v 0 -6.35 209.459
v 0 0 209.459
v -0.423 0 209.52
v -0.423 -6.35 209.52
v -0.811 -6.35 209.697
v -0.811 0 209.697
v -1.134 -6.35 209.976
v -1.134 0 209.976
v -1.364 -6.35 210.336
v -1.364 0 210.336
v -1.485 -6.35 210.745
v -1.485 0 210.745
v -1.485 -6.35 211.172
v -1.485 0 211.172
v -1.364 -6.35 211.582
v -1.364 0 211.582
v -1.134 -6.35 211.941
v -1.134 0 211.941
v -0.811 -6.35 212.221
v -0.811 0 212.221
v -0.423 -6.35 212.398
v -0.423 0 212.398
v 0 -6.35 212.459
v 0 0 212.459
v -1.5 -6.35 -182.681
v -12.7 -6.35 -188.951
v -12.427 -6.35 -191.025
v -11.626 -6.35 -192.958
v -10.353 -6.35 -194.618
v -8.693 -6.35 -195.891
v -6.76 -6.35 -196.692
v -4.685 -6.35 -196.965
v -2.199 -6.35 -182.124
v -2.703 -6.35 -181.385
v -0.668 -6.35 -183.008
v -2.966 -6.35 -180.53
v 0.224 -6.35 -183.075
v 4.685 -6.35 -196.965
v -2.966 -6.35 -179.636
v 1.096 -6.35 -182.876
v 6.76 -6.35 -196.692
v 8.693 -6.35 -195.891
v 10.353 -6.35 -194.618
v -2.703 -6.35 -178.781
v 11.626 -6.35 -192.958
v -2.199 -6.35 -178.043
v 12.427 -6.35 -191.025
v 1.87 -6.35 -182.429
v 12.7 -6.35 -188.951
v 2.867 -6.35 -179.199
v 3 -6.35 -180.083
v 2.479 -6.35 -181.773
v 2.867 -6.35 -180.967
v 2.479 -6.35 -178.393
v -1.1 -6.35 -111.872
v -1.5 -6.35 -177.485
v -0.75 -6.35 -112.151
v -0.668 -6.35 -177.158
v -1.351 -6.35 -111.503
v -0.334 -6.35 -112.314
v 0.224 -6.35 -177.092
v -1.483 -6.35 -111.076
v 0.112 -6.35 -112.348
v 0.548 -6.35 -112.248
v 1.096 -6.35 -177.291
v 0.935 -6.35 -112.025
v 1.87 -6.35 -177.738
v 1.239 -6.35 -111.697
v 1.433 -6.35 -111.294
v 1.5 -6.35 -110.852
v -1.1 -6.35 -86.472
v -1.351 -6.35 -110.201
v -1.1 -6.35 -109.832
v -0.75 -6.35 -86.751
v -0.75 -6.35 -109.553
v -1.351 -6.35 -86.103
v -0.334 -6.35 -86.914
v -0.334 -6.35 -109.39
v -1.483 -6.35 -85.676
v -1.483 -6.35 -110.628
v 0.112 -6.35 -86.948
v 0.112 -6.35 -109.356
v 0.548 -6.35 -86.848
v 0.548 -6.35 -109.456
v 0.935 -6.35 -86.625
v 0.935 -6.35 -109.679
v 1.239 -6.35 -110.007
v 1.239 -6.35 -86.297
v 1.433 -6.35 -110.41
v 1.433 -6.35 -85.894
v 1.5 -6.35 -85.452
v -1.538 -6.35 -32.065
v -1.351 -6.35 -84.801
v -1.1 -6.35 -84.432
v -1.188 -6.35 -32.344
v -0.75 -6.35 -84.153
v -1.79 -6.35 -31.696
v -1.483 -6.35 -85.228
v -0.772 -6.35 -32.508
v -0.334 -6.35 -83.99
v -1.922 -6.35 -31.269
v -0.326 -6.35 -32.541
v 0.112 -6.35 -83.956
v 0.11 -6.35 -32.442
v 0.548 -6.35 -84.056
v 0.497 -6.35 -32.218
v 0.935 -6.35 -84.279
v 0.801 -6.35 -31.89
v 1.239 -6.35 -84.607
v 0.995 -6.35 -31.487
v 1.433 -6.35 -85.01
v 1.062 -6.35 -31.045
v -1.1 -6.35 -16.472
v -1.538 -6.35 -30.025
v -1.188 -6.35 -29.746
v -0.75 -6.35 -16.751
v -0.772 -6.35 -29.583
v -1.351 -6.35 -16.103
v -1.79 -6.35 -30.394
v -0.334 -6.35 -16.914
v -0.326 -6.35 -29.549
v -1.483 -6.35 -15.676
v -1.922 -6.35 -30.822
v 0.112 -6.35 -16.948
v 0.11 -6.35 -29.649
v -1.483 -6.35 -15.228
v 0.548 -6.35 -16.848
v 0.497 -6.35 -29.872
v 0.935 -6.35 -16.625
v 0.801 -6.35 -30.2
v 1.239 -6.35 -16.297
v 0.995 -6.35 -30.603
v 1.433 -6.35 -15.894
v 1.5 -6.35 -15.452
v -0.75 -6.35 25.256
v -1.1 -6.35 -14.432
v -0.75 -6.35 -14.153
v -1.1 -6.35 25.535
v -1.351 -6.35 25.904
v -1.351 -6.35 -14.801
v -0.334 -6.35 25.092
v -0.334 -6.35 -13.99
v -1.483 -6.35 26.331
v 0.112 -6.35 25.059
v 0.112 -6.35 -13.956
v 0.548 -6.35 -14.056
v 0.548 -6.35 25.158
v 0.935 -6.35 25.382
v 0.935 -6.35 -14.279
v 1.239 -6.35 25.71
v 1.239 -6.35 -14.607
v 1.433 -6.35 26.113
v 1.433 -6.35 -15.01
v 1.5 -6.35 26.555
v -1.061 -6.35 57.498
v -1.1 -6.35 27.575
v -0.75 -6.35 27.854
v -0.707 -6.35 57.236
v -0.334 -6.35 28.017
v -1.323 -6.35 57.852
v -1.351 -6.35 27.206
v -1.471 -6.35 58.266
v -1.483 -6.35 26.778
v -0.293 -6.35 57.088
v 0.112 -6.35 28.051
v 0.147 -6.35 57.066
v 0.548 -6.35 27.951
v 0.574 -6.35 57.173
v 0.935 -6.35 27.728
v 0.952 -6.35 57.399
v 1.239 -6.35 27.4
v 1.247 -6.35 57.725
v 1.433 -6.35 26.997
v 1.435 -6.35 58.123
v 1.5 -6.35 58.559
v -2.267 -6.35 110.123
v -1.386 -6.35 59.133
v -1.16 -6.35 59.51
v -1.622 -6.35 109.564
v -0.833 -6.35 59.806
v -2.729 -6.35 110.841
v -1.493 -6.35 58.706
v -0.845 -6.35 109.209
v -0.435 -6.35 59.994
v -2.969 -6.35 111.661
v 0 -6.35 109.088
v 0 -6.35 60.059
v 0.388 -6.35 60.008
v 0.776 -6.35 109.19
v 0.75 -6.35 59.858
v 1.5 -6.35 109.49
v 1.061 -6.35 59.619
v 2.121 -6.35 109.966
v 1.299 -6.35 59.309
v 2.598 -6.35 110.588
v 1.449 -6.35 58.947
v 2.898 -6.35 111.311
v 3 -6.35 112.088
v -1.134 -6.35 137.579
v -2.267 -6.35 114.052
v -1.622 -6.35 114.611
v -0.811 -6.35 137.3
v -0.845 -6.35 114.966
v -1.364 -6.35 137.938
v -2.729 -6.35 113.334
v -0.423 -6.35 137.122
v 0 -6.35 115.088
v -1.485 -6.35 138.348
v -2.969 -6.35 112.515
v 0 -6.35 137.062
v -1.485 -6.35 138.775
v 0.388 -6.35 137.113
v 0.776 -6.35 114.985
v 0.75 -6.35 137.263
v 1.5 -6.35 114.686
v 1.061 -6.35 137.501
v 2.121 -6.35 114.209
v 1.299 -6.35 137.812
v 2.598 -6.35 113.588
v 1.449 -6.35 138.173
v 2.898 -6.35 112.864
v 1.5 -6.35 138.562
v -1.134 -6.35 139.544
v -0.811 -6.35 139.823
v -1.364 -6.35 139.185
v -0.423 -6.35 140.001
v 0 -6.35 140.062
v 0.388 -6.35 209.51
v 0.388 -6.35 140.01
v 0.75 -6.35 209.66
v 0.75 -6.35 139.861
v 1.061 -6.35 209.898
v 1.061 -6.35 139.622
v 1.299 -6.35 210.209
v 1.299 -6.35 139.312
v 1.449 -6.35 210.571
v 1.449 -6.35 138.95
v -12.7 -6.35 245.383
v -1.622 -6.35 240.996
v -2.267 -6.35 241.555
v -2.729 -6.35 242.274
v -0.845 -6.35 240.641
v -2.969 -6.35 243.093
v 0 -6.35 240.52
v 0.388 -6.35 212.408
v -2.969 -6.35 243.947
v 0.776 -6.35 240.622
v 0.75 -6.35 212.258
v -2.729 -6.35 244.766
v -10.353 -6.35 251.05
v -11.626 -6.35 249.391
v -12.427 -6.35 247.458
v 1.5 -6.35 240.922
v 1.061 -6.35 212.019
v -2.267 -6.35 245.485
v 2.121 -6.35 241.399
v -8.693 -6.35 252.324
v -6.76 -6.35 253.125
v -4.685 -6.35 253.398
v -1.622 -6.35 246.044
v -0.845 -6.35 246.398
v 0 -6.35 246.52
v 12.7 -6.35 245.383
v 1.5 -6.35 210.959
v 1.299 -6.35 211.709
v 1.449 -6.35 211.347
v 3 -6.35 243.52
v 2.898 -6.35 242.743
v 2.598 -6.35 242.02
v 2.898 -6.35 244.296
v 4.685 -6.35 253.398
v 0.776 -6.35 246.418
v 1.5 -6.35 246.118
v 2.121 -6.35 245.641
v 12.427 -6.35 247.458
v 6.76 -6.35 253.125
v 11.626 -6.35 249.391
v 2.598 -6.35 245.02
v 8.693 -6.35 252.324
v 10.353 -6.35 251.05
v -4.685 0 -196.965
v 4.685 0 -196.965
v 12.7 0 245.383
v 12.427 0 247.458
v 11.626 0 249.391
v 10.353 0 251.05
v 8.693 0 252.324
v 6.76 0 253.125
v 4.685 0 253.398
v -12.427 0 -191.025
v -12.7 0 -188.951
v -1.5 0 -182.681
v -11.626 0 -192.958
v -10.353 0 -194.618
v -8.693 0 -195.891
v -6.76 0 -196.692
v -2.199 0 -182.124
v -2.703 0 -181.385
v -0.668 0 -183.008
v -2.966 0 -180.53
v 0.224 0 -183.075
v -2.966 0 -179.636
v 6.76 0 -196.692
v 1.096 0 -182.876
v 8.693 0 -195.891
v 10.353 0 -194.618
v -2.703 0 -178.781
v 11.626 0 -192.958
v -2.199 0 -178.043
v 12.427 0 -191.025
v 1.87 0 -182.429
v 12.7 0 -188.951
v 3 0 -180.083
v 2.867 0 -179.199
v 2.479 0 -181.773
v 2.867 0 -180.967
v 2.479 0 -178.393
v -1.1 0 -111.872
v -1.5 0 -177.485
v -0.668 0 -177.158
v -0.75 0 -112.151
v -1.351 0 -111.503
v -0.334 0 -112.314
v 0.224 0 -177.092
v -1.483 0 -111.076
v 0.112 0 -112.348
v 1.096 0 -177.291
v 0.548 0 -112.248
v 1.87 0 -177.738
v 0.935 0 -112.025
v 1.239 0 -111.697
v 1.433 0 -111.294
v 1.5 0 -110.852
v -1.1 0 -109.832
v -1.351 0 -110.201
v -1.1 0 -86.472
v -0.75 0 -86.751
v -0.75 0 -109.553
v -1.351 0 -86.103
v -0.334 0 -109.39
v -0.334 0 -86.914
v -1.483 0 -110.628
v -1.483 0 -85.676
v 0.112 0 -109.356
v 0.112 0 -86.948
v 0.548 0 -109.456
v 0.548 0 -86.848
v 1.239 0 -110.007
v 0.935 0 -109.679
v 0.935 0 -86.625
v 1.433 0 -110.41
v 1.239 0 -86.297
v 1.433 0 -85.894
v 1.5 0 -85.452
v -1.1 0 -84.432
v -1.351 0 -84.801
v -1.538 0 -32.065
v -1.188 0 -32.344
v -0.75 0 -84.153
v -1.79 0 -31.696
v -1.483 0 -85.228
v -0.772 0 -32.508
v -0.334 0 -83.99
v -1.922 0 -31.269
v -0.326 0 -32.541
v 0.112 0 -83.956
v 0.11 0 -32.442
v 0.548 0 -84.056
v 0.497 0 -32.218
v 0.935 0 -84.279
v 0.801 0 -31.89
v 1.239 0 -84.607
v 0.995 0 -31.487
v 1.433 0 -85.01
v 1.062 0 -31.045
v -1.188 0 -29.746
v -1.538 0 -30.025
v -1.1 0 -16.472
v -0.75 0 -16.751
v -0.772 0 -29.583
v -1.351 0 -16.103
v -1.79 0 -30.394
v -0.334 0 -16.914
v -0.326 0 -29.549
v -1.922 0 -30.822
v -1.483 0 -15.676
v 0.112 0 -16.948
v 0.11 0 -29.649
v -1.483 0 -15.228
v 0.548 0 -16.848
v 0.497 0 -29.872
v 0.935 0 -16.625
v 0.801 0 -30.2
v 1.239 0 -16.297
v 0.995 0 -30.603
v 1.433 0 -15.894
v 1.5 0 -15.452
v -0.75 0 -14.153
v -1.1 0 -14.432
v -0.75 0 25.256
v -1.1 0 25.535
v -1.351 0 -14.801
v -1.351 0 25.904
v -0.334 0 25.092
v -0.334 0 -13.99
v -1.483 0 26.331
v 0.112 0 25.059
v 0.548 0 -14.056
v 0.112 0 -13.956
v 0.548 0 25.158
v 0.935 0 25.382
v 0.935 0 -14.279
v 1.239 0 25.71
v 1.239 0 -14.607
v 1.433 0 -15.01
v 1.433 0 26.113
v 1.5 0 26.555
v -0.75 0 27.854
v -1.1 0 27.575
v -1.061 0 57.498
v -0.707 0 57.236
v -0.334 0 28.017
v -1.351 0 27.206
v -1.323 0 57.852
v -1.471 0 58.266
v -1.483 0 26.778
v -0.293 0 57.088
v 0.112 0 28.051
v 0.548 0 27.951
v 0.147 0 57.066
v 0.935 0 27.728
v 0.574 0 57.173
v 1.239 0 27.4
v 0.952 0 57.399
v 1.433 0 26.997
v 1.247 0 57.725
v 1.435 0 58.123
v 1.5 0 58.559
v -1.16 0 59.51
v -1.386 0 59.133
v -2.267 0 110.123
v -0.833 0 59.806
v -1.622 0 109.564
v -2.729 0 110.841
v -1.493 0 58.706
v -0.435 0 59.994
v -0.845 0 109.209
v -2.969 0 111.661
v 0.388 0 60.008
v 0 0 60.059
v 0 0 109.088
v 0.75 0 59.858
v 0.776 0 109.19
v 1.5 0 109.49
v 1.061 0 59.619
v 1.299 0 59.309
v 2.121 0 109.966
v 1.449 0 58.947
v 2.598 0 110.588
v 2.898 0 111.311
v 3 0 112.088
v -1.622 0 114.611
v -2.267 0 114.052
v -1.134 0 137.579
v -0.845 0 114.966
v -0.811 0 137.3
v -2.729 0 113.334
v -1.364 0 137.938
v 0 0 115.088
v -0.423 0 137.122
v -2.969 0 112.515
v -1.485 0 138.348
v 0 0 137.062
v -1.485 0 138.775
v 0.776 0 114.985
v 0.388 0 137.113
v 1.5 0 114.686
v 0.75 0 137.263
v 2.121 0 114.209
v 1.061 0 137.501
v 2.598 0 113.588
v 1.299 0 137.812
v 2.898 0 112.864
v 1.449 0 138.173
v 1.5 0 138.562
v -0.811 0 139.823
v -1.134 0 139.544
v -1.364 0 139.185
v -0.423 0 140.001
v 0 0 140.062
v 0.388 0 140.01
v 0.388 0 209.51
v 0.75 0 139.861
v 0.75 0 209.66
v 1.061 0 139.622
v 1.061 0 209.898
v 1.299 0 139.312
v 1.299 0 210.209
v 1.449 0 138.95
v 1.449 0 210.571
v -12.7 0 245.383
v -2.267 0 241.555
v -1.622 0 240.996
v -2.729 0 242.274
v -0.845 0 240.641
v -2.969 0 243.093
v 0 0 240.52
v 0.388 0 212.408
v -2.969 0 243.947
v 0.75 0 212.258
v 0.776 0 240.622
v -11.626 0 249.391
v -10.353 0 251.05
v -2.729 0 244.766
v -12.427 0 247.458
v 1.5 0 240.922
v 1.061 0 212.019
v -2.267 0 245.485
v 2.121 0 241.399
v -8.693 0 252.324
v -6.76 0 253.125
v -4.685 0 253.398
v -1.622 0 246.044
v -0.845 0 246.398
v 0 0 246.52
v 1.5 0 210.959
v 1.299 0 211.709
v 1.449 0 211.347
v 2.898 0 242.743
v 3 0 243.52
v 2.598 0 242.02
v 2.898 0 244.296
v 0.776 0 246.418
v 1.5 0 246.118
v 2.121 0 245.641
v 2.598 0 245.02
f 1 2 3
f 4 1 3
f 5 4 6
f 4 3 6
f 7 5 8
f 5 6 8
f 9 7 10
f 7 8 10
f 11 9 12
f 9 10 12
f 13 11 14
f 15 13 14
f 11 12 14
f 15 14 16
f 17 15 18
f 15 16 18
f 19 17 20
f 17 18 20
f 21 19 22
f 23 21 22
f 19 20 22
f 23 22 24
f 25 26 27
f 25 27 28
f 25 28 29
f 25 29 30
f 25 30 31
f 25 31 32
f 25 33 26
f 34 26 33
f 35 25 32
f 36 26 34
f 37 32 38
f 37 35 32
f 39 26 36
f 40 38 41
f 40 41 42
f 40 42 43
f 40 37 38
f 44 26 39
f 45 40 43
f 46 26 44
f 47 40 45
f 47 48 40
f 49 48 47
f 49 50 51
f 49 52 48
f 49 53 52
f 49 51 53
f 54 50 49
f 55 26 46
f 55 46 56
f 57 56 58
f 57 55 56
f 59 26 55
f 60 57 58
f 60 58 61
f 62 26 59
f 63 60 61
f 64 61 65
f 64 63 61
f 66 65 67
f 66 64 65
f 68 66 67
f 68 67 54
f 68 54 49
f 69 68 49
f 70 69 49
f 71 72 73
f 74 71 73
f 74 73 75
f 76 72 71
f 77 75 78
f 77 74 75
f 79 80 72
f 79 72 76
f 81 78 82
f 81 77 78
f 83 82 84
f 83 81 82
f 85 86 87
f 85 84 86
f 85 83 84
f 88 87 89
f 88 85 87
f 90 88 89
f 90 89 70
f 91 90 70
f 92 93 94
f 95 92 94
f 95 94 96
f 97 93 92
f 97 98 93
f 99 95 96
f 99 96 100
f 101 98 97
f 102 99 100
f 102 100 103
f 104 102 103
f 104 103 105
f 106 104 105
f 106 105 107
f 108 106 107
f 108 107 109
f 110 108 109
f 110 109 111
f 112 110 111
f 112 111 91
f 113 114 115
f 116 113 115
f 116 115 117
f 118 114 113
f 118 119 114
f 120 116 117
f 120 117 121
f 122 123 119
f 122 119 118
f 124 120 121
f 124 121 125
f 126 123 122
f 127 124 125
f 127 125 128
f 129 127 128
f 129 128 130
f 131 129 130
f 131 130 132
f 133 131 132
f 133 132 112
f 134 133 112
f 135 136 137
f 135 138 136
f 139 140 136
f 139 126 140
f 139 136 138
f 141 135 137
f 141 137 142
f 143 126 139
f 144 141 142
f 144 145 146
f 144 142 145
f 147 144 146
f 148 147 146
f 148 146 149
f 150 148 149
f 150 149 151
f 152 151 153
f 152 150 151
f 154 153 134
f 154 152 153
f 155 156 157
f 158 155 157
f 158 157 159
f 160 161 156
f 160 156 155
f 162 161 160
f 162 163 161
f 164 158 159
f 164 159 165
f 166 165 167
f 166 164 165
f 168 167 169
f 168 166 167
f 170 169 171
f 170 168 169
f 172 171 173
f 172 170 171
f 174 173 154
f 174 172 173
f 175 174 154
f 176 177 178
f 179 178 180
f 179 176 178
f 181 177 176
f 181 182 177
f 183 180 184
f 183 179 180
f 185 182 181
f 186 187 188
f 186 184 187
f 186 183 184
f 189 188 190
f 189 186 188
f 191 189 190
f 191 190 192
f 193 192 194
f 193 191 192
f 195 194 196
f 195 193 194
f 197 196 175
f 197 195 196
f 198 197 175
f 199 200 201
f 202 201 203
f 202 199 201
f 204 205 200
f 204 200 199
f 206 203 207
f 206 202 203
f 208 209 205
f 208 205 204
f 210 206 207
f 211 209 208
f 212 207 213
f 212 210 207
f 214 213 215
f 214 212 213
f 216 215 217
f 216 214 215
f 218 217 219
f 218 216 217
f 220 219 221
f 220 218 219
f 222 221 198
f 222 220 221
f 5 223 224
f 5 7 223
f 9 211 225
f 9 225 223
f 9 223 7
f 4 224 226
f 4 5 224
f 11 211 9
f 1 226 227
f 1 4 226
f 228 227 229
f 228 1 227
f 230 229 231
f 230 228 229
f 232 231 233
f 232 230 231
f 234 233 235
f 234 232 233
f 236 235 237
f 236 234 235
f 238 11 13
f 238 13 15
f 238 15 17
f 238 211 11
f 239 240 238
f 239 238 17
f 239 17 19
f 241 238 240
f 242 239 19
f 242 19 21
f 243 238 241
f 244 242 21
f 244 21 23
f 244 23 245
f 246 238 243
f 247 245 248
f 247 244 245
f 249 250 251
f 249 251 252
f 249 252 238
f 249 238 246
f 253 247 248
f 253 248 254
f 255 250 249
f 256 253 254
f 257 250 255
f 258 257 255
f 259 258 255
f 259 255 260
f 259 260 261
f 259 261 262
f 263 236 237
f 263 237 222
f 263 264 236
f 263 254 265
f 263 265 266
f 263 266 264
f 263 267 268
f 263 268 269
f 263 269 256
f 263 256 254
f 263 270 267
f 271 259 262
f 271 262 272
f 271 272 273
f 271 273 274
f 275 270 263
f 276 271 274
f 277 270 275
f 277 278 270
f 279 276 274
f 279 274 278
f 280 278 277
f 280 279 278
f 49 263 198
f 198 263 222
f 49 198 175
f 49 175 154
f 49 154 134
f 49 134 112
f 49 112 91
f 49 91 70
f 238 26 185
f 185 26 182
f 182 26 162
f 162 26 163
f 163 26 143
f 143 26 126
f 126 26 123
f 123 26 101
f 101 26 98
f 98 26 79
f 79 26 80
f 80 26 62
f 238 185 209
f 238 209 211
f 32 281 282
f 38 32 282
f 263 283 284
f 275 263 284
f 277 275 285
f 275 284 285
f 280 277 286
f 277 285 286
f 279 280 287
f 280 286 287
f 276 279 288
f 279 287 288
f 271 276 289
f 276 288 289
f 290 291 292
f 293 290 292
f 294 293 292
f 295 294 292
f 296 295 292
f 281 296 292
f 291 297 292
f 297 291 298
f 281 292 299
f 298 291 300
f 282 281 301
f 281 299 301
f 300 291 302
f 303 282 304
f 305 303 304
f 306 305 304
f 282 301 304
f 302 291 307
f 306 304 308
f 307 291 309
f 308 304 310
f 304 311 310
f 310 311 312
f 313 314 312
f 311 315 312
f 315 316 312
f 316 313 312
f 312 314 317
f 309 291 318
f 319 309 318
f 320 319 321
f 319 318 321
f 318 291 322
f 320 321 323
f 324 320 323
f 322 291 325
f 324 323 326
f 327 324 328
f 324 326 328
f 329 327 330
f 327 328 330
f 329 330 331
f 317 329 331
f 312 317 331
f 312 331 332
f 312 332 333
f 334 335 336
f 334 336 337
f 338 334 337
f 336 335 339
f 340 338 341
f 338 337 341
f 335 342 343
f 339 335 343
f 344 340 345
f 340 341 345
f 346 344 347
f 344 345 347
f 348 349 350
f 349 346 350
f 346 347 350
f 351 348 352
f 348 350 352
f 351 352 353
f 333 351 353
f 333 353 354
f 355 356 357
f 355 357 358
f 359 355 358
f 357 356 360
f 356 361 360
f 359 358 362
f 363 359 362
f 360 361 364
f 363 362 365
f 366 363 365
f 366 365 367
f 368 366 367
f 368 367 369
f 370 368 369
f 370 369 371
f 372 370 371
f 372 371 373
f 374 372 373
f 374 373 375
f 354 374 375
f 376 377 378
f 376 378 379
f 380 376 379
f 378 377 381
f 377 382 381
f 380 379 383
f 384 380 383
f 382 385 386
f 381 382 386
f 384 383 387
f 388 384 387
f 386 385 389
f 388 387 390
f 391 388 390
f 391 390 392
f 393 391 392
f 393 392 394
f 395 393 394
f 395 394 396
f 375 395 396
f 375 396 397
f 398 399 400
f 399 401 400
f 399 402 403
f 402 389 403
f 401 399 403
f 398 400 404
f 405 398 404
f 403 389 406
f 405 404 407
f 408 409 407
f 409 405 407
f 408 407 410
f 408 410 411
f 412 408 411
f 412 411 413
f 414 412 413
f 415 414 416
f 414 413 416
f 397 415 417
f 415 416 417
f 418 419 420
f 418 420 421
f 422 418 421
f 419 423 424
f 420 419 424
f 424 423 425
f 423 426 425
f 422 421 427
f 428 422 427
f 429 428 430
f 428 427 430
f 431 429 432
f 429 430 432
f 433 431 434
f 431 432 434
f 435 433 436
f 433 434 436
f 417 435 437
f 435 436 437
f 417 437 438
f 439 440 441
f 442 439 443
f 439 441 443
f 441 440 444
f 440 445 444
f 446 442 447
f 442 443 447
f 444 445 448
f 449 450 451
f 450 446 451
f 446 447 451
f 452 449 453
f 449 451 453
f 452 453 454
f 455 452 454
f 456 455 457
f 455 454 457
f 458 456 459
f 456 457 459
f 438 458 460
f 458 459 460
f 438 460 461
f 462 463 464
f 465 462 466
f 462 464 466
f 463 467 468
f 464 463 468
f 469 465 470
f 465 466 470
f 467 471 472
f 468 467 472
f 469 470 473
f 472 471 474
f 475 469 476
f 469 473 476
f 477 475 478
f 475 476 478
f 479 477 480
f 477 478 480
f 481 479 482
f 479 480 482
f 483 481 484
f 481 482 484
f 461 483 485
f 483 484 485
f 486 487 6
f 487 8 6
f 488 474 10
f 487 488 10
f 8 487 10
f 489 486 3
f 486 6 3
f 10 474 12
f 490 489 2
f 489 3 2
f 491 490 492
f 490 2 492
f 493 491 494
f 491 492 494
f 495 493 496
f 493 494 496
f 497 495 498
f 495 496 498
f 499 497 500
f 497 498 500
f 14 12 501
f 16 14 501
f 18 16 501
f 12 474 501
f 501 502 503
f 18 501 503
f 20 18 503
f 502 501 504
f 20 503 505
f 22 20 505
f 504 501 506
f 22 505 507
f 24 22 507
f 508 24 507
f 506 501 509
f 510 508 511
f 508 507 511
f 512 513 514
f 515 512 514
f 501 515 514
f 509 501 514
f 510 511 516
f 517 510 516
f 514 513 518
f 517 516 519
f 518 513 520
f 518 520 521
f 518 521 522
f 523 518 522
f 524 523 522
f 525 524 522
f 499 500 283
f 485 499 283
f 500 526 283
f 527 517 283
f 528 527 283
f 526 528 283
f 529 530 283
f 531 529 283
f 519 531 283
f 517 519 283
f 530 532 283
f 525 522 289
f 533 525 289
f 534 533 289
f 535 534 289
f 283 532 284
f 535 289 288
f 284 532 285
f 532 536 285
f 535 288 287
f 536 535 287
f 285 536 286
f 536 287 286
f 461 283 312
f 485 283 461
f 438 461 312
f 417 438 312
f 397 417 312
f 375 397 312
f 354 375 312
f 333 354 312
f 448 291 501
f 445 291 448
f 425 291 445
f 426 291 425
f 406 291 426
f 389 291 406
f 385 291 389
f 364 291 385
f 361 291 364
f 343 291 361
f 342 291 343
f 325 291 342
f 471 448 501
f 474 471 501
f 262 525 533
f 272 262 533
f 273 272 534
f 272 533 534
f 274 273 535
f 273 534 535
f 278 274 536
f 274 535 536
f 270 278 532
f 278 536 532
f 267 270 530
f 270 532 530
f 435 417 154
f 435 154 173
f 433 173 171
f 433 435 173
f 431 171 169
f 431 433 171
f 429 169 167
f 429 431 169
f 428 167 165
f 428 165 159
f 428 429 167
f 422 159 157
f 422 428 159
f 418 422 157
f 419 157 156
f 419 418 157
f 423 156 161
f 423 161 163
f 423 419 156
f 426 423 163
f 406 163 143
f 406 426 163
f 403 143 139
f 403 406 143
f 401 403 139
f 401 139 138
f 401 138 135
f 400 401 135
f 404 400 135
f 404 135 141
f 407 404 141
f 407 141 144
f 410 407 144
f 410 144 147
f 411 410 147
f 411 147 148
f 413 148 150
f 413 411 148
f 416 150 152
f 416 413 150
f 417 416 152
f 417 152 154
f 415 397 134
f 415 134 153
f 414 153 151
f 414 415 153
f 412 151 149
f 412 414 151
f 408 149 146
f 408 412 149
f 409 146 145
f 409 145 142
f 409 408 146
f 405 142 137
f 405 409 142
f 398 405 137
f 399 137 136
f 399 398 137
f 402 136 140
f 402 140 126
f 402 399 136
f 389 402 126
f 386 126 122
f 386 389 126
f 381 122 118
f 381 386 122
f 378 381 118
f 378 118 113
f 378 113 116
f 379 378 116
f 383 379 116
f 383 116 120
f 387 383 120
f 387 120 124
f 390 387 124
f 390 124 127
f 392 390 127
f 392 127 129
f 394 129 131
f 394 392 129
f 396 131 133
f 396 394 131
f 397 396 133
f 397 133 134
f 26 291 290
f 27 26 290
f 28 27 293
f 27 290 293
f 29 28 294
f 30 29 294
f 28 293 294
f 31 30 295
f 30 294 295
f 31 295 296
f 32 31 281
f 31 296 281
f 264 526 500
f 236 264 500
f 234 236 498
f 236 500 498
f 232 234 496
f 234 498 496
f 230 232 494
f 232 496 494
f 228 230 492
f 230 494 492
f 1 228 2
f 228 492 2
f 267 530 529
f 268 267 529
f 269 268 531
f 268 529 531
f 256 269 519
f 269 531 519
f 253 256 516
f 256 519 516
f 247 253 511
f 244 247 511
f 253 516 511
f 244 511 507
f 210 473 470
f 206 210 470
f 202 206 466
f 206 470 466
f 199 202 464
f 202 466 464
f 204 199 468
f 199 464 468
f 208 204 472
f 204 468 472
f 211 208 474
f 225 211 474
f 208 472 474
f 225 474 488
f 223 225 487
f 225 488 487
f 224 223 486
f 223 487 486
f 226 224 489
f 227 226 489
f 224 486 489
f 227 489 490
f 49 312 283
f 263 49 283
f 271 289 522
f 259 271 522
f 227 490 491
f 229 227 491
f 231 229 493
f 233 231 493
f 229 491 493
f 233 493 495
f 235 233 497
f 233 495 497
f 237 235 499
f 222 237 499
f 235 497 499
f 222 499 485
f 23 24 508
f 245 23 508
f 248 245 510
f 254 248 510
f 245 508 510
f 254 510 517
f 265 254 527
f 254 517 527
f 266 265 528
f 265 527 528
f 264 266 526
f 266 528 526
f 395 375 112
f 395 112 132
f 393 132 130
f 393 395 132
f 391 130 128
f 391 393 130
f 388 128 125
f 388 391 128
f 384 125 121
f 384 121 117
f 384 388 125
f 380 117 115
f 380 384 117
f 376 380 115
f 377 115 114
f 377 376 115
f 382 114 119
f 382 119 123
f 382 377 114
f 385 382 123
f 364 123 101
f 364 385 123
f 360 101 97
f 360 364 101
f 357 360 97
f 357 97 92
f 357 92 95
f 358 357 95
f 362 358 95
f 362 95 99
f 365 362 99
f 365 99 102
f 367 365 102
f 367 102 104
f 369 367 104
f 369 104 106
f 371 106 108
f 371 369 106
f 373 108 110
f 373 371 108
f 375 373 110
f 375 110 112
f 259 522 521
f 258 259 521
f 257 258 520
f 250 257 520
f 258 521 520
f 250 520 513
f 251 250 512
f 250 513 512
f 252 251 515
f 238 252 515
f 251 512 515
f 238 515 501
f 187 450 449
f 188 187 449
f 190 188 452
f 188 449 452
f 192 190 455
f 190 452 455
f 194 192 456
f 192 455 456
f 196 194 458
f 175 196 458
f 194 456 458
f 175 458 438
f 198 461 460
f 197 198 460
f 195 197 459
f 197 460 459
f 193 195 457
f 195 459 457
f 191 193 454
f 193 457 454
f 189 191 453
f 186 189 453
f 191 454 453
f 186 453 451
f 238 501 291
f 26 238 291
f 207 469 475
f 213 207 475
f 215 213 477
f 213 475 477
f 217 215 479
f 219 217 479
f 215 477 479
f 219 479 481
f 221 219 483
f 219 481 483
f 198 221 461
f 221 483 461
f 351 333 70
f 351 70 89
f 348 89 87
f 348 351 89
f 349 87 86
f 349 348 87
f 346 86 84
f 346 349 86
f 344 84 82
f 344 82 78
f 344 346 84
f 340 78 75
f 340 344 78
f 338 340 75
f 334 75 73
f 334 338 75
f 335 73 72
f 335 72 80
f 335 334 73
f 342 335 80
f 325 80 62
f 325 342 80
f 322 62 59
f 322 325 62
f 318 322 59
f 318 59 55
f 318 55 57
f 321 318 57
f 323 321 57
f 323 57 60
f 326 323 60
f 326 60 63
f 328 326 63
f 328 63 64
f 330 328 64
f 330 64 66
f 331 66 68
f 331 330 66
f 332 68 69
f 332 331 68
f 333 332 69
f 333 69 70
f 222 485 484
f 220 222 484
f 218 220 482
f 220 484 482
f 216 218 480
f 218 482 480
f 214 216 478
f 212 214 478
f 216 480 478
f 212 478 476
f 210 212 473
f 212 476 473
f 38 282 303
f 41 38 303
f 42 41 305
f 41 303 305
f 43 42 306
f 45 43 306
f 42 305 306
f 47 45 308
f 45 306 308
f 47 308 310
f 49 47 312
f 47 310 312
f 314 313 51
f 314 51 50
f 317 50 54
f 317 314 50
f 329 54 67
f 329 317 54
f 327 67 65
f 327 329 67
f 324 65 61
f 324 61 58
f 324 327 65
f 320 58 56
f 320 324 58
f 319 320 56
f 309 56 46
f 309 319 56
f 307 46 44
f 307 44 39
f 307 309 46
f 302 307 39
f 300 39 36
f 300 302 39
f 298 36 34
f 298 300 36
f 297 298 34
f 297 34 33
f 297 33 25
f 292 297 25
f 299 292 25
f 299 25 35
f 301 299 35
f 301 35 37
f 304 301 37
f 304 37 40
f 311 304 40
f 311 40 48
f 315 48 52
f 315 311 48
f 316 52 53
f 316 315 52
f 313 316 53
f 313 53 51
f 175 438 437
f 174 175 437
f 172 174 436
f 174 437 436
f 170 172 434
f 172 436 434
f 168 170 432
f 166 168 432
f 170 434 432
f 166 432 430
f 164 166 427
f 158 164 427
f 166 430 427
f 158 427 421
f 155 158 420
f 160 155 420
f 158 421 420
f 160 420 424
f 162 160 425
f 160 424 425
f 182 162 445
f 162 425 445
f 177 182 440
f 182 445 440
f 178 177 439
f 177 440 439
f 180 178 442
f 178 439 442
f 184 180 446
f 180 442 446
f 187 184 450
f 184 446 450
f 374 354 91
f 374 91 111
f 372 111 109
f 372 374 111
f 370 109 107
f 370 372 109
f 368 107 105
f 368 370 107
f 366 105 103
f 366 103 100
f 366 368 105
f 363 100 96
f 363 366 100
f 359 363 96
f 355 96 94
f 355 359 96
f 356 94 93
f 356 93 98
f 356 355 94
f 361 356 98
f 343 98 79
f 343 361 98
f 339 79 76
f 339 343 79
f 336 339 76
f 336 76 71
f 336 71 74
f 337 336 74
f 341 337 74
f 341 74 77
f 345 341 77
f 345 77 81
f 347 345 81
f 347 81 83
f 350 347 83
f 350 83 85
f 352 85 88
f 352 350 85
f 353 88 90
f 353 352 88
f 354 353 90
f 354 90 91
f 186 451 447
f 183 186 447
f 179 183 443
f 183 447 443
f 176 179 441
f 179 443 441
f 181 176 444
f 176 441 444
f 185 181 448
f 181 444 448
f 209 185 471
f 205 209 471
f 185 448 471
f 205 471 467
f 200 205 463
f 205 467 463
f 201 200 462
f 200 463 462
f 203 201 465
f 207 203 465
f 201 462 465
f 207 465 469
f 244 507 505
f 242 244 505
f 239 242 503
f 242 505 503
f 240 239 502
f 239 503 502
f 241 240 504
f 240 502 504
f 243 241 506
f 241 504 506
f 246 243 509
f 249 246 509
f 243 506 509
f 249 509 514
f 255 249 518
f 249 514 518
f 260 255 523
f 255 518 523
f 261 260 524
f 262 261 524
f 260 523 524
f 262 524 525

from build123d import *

# Parameters (mm, degrees)
F0_R     = 3
F0_R_2   = 1.5
F1_DEPTH = 6.35


with BuildPart() as f1:
    # F0 (on Front) → F1 (new body)
    with BuildSketch(Plane.XZ):
        with BuildLine():
            ThreePointArc((-12.7, -188.950539), (-10.352556, -194.61777), (-4.685325, -196.965214))
            Line((-4.685325, -196.965214), (4.685325, -196.965214))
            ThreePointArc((4.685325, -196.965214), (10.352556, -194.61777), (12.7, -188.950539))
            Line((12.7, -188.950539), (12.7, 245.383261))
            ThreePointArc((12.7, 245.383261), (10.352556, 251.050492), (4.685325, 253.397937))
            Line((4.685325, 253.397937), (0, 253.397937))
            Line((0, 253.397937), (-4.685325, 253.397937))
            ThreePointArc((-4.685325, 253.397937), (-10.352556, 251.050492), (-12.7, 245.383261))
            Line((-12.7, 245.383261), (-12.7, -188.950539))
        make_face()
        with Locations((0, -180.083141)):
            Circle(F0_R, mode=Mode.SUBTRACT)
        with Locations((0, -110.852026)):
            Circle(F0_R_2, mode=Mode.SUBTRACT)
        with Locations((0, -85.452026)):
            Circle(F0_R_2, mode=Mode.SUBTRACT)
        with Locations((-0.438477, -31.045226)):
            Circle(F0_R_2, mode=Mode.SUBTRACT)
        with Locations((0, -15.452026)):
            Circle(F0_R_2, mode=Mode.SUBTRACT)
        with Locations((0, 26.554786)):
            Circle(F0_R_2, mode=Mode.SUBTRACT)
        with BuildLine():
            ThreePointArc((1.5, 58.558786), (-1.06066, 57.498125), (0, 60.058786))
            ThreePointArc((0, 60.058786), (1.06066, 59.619446), (1.5, 58.558786))
        make_face(mode=Mode.SUBTRACT)
        with BuildLine():
            ThreePointArc((0, 109.087622), (-3, 112.087622), (0, 115.087622))
            ThreePointArc((0, 115.087622), (2.12132, 114.208943), (3, 112.087622))
            ThreePointArc((3, 112.087622), (2.12132, 109.966302), (0, 109.087622))
        make_face(mode=Mode.SUBTRACT)
        with BuildLine():
            ThreePointArc((0, 137.061597), (-1.5, 138.561597), (0, 140.061597))
            ThreePointArc((0, 140.061597), (1.06066, 139.622258), (1.5, 138.561597))
            ThreePointArc((1.5, 138.561597), (1.06066, 137.500937), (0, 137.061597))
        make_face(mode=Mode.SUBTRACT)
        with BuildLine():
            ThreePointArc((0, 209.458786), (-1.5, 210.958786), (0, 212.458786))
            ThreePointArc((0, 212.458786), (1.06066, 212.019446), (1.5, 210.958786))
            ThreePointArc((1.5, 210.958786), (1.06066, 209.898125), (0, 209.458786))
        make_face(mode=Mode.SUBTRACT)
        with BuildLine():
            ThreePointArc((0, 240.519919), (-3, 243.519919), (0, 246.519919))
            ThreePointArc((0, 246.519919), (2.12132, 245.64124), (3, 243.519919))
            ThreePointArc((3, 243.519919), (2.12132, 241.398599), (0, 240.519919))
        make_face(mode=Mode.SUBTRACT)
    extrude(amount=F1_DEPTH)


solid = f1.part
